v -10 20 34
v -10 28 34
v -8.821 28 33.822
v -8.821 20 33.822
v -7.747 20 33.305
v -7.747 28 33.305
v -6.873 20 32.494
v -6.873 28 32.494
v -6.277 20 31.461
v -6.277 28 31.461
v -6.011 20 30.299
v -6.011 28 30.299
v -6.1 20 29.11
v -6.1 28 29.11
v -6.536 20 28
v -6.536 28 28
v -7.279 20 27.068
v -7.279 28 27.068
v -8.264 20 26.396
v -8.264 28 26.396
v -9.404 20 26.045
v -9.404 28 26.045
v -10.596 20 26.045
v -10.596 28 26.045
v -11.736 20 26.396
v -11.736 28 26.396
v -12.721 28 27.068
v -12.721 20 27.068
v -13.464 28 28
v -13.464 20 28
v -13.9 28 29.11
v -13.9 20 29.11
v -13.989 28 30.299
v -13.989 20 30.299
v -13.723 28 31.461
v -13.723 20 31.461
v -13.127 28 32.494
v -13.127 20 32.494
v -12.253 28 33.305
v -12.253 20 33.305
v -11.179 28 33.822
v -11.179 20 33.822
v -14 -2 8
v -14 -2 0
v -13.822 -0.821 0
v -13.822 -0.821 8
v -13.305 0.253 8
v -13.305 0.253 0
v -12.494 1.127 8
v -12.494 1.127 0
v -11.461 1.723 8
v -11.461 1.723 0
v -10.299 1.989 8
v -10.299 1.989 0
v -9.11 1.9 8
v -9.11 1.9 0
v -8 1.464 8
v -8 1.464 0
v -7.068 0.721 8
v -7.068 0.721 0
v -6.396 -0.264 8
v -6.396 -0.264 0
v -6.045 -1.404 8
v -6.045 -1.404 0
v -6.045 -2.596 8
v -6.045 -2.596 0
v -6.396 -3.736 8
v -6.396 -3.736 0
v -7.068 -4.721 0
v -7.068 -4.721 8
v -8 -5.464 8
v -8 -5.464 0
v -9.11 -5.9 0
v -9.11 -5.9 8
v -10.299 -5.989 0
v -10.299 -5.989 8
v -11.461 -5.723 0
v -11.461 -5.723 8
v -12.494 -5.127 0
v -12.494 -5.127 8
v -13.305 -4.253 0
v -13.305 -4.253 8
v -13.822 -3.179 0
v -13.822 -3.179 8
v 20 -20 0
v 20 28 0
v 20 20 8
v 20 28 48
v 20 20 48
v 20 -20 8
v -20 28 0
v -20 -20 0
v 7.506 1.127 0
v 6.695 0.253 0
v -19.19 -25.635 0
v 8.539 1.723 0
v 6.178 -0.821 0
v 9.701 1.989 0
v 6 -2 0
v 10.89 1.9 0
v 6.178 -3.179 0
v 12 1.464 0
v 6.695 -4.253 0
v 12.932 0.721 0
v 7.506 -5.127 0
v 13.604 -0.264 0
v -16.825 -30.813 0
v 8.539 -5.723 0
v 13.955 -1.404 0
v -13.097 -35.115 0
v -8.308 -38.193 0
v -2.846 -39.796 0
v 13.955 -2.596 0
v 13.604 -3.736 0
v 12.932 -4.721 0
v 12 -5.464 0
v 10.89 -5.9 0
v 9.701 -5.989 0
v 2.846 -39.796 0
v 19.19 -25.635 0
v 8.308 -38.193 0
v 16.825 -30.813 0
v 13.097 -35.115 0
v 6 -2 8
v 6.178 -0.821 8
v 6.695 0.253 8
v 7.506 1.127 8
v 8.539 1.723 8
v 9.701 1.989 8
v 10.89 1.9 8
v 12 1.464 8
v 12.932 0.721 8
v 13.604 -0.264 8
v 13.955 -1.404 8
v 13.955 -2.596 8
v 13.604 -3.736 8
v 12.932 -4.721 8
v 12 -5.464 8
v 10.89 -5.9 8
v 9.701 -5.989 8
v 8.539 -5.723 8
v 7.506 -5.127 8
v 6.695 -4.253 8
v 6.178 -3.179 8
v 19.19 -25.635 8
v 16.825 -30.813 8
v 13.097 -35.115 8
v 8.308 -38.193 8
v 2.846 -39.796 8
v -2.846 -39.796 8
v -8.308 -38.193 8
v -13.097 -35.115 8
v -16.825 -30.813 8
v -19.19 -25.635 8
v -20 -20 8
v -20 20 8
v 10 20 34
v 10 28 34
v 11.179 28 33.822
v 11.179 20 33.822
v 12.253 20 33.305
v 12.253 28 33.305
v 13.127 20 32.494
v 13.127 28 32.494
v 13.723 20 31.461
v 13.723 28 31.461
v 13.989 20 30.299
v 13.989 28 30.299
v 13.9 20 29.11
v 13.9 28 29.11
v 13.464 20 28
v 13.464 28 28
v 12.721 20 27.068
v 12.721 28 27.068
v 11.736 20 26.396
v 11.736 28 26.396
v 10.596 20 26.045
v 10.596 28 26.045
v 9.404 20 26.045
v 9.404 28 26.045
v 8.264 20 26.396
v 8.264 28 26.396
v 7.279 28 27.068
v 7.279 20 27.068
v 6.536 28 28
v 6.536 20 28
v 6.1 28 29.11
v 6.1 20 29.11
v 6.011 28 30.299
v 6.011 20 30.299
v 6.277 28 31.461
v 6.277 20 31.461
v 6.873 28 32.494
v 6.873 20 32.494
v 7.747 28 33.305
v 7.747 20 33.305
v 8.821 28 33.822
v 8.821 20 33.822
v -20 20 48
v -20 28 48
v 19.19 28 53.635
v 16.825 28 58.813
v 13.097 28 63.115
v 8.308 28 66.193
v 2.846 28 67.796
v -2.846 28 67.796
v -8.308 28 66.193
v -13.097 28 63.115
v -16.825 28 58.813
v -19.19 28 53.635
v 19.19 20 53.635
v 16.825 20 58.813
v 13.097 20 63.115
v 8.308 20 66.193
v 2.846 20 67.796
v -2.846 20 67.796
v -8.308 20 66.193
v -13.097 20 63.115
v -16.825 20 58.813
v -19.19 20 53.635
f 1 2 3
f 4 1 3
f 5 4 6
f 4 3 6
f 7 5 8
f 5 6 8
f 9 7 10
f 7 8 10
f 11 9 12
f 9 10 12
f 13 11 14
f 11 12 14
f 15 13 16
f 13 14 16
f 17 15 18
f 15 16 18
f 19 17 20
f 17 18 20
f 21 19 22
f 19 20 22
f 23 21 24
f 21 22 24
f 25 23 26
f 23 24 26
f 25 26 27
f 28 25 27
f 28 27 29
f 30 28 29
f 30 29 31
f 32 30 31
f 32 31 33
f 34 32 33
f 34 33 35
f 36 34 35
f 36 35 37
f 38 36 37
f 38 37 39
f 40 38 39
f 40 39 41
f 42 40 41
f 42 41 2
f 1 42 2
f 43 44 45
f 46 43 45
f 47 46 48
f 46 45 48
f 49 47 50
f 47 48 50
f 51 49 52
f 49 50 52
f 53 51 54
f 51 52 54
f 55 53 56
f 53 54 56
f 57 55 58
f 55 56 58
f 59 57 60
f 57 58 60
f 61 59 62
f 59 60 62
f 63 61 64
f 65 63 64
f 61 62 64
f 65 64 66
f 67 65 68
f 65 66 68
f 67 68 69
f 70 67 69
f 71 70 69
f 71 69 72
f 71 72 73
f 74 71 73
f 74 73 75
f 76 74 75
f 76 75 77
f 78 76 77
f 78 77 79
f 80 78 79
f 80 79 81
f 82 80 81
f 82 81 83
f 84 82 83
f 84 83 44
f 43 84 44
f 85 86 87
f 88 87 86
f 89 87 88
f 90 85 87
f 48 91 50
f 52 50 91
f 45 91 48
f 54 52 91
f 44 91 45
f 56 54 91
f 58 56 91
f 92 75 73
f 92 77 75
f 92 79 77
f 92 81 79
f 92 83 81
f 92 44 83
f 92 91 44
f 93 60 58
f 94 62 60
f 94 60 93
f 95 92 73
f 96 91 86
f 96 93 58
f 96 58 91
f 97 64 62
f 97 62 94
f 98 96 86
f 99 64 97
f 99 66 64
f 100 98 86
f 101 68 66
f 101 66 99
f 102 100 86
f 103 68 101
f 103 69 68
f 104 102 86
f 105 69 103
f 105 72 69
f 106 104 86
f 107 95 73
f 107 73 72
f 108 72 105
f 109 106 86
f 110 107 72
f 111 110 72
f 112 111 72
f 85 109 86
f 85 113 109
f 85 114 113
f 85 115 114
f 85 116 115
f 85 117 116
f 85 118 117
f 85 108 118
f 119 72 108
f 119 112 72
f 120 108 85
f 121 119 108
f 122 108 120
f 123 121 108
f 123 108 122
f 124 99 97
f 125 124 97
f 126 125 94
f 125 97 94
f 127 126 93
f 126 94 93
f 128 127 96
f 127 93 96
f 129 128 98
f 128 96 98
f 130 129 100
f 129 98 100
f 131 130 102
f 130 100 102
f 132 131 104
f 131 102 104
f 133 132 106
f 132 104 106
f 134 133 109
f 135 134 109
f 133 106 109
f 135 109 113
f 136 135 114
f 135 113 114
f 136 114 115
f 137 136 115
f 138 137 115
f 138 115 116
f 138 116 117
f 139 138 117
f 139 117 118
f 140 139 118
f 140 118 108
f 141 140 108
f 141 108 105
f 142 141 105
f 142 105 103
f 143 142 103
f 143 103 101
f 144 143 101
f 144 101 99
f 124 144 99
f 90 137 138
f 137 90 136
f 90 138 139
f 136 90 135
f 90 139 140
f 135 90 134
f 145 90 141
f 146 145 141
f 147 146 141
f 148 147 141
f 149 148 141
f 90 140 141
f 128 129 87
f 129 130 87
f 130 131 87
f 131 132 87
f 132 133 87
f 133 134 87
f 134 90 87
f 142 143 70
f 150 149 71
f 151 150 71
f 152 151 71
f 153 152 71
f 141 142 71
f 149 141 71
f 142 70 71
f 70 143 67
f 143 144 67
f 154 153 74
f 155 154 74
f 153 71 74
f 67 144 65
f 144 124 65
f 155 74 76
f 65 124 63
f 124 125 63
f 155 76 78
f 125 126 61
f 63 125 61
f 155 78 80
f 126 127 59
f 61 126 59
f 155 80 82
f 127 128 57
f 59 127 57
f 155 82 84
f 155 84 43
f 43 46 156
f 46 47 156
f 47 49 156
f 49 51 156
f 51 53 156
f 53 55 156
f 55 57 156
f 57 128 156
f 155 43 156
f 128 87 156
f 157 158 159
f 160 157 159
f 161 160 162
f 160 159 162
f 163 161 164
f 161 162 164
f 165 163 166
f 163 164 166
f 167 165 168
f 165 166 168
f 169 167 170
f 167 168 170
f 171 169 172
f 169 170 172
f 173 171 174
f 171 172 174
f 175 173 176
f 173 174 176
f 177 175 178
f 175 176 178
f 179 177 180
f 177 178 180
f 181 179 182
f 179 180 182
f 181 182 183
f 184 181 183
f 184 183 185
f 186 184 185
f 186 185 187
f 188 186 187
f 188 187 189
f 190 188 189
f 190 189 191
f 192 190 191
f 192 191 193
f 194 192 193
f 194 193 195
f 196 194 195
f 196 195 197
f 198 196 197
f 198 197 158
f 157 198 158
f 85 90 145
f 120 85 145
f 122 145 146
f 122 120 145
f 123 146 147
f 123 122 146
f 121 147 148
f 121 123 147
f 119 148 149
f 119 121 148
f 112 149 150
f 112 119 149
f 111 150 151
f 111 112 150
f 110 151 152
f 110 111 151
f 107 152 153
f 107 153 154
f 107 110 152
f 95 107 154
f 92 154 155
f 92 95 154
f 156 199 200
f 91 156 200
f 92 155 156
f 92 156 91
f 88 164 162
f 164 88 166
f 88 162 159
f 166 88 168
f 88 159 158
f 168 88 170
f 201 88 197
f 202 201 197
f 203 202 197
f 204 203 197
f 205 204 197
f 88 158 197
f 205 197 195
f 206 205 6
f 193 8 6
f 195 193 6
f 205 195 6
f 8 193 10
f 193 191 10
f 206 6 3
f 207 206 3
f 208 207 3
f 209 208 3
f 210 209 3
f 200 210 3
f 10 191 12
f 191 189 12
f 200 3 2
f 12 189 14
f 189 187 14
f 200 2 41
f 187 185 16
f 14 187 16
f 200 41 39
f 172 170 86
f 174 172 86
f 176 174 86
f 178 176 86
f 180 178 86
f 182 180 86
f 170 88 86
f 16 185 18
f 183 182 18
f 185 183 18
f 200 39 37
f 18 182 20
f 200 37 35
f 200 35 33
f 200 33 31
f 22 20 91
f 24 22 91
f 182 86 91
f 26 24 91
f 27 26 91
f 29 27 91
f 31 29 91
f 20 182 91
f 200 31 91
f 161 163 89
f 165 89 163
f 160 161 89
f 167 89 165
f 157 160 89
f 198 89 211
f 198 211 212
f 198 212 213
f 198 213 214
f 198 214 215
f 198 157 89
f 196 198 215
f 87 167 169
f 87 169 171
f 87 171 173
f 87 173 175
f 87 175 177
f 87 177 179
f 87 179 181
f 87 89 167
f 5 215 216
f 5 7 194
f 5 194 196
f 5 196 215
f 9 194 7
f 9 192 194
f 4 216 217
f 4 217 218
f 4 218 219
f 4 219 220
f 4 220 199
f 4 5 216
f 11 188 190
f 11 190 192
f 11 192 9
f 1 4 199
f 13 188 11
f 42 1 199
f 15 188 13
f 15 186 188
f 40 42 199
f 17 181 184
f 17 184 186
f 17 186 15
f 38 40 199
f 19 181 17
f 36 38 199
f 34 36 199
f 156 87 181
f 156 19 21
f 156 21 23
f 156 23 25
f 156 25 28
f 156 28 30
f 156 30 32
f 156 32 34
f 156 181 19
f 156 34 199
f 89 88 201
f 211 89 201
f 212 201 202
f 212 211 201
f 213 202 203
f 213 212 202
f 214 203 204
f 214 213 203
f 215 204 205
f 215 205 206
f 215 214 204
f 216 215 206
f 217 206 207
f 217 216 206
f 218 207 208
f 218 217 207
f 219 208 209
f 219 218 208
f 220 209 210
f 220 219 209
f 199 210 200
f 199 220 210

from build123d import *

# Parameters (mm, degrees)
EXTRUDE_1_DEPTH     = 8
EXTRUDE_2_DEPTH     = 8
CUT_EXTRUDE_1_REACH = 83.388
SKETCH_3_R          = 4
CUT_EXTRUDE_2_REACH = 100.224
SKETCH_4_R          = 4


with BuildPart() as part:
    # 草图1 → 凸台-拉伸1 (new body)
    with BuildSketch(Plane.XY):
        with BuildLine():
            Line((-20, 20), (20, 20))
            Line((20, 20), (20, -20))
            ThreePointArc((20, -20), (0, -40), (-20, -20))
            Line((-20, -20), (-20, 20))
        make_face()
    extrude(amount=EXTRUDE_1_DEPTH)

    # 草图2 → 凸台-拉伸2 (add)
    with BuildSketch(Plane(origin=(0, 20, 0), x_dir=(1, 0, 0), z_dir=(0, 1, 0))):
        with BuildLine():
            Line((-20, 0), (20, 0))
            Line((20, 0), (20, -48))
            ThreePointArc((20, -48), (0, -68), (-20, -48))
            Line((-20, -48), (-20, 0))
        make_face()
    extrude(amount=EXTRUDE_2_DEPTH)

    # 草图3 → 切除-拉伸1 (cut, up to next)
    with BuildSketch(Plane(origin=(0, 0, 0), x_dir=(-1, 0, 0), z_dir=(0, 0, -1)), mode=Mode.PRIVATE) as cut_extrude_1_sk1:
        with Locations((-10, -2)):
            Circle(SKETCH_3_R)
    cut_extrude_1_tool1 = extrude(cut_extrude_1_sk1.sketch, amount=-CUT_EXTRUDE_1_REACH, mode=Mode.PRIVATE) & part.part
    # 草图3 → 切除-拉伸1 (cut, up to next)
    with BuildSketch(Plane(origin=(0, 0, 0), x_dir=(-1, 0, 0), z_dir=(0, 0, -1)), mode=Mode.PRIVATE) as cut_extrude_1_sk2:
        with Locations((10, -2)):
            Circle(SKETCH_3_R)
    cut_extrude_1_tool2 = extrude(cut_extrude_1_sk2.sketch, amount=-CUT_EXTRUDE_1_REACH, mode=Mode.PRIVATE) & part.part
    add(cut_extrude_1_tool1.solids().sort_by_distance((10, -2, 0))[0], mode=Mode.SUBTRACT)
    add(cut_extrude_1_tool2.solids().sort_by_distance((-10, -2, 0))[0], mode=Mode.SUBTRACT)

    # 草图4 → 切除-拉伸2 (cut, up to next)
    with BuildSketch(Plane(origin=(0, 28, 0), x_dir=(1, 0, 0), z_dir=(0, 1, 0)), mode=Mode.PRIVATE) as cut_extrude_2_sk1:
        with Locations(Location((-10, -30, 0), (0, 0, 270))):
            Circle(SKETCH_4_R)
    cut_extrude_2_tool1 = extrude(cut_extrude_2_sk1.sketch, amount=-CUT_EXTRUDE_2_REACH, mode=Mode.PRIVATE) & part.part
    # 草图4 → 切除-拉伸2 (cut, up to next)
    with BuildSketch(Plane(origin=(0, 28, 0), x_dir=(1, 0, 0), z_dir=(0, 1, 0)), mode=Mode.PRIVATE) as cut_extrude_2_sk2:
        with Locations(Location((10, -30, 0), (0, 0, 270))):
            Circle(SKETCH_4_R)
    cut_extrude_2_tool2 = extrude(cut_extrude_2_sk2.sketch, amount=-CUT_EXTRUDE_2_REACH, mode=Mode.PRIVATE) & part.part
    add(cut_extrude_2_tool1.solids().sort_by_distance((-10, 28, 30))[0], mode=Mode.SUBTRACT)
    add(cut_extrude_2_tool2.solids().sort_by_distance((10, 28, 30))[0], mode=Mode.SUBTRACT)


solid = part.part
